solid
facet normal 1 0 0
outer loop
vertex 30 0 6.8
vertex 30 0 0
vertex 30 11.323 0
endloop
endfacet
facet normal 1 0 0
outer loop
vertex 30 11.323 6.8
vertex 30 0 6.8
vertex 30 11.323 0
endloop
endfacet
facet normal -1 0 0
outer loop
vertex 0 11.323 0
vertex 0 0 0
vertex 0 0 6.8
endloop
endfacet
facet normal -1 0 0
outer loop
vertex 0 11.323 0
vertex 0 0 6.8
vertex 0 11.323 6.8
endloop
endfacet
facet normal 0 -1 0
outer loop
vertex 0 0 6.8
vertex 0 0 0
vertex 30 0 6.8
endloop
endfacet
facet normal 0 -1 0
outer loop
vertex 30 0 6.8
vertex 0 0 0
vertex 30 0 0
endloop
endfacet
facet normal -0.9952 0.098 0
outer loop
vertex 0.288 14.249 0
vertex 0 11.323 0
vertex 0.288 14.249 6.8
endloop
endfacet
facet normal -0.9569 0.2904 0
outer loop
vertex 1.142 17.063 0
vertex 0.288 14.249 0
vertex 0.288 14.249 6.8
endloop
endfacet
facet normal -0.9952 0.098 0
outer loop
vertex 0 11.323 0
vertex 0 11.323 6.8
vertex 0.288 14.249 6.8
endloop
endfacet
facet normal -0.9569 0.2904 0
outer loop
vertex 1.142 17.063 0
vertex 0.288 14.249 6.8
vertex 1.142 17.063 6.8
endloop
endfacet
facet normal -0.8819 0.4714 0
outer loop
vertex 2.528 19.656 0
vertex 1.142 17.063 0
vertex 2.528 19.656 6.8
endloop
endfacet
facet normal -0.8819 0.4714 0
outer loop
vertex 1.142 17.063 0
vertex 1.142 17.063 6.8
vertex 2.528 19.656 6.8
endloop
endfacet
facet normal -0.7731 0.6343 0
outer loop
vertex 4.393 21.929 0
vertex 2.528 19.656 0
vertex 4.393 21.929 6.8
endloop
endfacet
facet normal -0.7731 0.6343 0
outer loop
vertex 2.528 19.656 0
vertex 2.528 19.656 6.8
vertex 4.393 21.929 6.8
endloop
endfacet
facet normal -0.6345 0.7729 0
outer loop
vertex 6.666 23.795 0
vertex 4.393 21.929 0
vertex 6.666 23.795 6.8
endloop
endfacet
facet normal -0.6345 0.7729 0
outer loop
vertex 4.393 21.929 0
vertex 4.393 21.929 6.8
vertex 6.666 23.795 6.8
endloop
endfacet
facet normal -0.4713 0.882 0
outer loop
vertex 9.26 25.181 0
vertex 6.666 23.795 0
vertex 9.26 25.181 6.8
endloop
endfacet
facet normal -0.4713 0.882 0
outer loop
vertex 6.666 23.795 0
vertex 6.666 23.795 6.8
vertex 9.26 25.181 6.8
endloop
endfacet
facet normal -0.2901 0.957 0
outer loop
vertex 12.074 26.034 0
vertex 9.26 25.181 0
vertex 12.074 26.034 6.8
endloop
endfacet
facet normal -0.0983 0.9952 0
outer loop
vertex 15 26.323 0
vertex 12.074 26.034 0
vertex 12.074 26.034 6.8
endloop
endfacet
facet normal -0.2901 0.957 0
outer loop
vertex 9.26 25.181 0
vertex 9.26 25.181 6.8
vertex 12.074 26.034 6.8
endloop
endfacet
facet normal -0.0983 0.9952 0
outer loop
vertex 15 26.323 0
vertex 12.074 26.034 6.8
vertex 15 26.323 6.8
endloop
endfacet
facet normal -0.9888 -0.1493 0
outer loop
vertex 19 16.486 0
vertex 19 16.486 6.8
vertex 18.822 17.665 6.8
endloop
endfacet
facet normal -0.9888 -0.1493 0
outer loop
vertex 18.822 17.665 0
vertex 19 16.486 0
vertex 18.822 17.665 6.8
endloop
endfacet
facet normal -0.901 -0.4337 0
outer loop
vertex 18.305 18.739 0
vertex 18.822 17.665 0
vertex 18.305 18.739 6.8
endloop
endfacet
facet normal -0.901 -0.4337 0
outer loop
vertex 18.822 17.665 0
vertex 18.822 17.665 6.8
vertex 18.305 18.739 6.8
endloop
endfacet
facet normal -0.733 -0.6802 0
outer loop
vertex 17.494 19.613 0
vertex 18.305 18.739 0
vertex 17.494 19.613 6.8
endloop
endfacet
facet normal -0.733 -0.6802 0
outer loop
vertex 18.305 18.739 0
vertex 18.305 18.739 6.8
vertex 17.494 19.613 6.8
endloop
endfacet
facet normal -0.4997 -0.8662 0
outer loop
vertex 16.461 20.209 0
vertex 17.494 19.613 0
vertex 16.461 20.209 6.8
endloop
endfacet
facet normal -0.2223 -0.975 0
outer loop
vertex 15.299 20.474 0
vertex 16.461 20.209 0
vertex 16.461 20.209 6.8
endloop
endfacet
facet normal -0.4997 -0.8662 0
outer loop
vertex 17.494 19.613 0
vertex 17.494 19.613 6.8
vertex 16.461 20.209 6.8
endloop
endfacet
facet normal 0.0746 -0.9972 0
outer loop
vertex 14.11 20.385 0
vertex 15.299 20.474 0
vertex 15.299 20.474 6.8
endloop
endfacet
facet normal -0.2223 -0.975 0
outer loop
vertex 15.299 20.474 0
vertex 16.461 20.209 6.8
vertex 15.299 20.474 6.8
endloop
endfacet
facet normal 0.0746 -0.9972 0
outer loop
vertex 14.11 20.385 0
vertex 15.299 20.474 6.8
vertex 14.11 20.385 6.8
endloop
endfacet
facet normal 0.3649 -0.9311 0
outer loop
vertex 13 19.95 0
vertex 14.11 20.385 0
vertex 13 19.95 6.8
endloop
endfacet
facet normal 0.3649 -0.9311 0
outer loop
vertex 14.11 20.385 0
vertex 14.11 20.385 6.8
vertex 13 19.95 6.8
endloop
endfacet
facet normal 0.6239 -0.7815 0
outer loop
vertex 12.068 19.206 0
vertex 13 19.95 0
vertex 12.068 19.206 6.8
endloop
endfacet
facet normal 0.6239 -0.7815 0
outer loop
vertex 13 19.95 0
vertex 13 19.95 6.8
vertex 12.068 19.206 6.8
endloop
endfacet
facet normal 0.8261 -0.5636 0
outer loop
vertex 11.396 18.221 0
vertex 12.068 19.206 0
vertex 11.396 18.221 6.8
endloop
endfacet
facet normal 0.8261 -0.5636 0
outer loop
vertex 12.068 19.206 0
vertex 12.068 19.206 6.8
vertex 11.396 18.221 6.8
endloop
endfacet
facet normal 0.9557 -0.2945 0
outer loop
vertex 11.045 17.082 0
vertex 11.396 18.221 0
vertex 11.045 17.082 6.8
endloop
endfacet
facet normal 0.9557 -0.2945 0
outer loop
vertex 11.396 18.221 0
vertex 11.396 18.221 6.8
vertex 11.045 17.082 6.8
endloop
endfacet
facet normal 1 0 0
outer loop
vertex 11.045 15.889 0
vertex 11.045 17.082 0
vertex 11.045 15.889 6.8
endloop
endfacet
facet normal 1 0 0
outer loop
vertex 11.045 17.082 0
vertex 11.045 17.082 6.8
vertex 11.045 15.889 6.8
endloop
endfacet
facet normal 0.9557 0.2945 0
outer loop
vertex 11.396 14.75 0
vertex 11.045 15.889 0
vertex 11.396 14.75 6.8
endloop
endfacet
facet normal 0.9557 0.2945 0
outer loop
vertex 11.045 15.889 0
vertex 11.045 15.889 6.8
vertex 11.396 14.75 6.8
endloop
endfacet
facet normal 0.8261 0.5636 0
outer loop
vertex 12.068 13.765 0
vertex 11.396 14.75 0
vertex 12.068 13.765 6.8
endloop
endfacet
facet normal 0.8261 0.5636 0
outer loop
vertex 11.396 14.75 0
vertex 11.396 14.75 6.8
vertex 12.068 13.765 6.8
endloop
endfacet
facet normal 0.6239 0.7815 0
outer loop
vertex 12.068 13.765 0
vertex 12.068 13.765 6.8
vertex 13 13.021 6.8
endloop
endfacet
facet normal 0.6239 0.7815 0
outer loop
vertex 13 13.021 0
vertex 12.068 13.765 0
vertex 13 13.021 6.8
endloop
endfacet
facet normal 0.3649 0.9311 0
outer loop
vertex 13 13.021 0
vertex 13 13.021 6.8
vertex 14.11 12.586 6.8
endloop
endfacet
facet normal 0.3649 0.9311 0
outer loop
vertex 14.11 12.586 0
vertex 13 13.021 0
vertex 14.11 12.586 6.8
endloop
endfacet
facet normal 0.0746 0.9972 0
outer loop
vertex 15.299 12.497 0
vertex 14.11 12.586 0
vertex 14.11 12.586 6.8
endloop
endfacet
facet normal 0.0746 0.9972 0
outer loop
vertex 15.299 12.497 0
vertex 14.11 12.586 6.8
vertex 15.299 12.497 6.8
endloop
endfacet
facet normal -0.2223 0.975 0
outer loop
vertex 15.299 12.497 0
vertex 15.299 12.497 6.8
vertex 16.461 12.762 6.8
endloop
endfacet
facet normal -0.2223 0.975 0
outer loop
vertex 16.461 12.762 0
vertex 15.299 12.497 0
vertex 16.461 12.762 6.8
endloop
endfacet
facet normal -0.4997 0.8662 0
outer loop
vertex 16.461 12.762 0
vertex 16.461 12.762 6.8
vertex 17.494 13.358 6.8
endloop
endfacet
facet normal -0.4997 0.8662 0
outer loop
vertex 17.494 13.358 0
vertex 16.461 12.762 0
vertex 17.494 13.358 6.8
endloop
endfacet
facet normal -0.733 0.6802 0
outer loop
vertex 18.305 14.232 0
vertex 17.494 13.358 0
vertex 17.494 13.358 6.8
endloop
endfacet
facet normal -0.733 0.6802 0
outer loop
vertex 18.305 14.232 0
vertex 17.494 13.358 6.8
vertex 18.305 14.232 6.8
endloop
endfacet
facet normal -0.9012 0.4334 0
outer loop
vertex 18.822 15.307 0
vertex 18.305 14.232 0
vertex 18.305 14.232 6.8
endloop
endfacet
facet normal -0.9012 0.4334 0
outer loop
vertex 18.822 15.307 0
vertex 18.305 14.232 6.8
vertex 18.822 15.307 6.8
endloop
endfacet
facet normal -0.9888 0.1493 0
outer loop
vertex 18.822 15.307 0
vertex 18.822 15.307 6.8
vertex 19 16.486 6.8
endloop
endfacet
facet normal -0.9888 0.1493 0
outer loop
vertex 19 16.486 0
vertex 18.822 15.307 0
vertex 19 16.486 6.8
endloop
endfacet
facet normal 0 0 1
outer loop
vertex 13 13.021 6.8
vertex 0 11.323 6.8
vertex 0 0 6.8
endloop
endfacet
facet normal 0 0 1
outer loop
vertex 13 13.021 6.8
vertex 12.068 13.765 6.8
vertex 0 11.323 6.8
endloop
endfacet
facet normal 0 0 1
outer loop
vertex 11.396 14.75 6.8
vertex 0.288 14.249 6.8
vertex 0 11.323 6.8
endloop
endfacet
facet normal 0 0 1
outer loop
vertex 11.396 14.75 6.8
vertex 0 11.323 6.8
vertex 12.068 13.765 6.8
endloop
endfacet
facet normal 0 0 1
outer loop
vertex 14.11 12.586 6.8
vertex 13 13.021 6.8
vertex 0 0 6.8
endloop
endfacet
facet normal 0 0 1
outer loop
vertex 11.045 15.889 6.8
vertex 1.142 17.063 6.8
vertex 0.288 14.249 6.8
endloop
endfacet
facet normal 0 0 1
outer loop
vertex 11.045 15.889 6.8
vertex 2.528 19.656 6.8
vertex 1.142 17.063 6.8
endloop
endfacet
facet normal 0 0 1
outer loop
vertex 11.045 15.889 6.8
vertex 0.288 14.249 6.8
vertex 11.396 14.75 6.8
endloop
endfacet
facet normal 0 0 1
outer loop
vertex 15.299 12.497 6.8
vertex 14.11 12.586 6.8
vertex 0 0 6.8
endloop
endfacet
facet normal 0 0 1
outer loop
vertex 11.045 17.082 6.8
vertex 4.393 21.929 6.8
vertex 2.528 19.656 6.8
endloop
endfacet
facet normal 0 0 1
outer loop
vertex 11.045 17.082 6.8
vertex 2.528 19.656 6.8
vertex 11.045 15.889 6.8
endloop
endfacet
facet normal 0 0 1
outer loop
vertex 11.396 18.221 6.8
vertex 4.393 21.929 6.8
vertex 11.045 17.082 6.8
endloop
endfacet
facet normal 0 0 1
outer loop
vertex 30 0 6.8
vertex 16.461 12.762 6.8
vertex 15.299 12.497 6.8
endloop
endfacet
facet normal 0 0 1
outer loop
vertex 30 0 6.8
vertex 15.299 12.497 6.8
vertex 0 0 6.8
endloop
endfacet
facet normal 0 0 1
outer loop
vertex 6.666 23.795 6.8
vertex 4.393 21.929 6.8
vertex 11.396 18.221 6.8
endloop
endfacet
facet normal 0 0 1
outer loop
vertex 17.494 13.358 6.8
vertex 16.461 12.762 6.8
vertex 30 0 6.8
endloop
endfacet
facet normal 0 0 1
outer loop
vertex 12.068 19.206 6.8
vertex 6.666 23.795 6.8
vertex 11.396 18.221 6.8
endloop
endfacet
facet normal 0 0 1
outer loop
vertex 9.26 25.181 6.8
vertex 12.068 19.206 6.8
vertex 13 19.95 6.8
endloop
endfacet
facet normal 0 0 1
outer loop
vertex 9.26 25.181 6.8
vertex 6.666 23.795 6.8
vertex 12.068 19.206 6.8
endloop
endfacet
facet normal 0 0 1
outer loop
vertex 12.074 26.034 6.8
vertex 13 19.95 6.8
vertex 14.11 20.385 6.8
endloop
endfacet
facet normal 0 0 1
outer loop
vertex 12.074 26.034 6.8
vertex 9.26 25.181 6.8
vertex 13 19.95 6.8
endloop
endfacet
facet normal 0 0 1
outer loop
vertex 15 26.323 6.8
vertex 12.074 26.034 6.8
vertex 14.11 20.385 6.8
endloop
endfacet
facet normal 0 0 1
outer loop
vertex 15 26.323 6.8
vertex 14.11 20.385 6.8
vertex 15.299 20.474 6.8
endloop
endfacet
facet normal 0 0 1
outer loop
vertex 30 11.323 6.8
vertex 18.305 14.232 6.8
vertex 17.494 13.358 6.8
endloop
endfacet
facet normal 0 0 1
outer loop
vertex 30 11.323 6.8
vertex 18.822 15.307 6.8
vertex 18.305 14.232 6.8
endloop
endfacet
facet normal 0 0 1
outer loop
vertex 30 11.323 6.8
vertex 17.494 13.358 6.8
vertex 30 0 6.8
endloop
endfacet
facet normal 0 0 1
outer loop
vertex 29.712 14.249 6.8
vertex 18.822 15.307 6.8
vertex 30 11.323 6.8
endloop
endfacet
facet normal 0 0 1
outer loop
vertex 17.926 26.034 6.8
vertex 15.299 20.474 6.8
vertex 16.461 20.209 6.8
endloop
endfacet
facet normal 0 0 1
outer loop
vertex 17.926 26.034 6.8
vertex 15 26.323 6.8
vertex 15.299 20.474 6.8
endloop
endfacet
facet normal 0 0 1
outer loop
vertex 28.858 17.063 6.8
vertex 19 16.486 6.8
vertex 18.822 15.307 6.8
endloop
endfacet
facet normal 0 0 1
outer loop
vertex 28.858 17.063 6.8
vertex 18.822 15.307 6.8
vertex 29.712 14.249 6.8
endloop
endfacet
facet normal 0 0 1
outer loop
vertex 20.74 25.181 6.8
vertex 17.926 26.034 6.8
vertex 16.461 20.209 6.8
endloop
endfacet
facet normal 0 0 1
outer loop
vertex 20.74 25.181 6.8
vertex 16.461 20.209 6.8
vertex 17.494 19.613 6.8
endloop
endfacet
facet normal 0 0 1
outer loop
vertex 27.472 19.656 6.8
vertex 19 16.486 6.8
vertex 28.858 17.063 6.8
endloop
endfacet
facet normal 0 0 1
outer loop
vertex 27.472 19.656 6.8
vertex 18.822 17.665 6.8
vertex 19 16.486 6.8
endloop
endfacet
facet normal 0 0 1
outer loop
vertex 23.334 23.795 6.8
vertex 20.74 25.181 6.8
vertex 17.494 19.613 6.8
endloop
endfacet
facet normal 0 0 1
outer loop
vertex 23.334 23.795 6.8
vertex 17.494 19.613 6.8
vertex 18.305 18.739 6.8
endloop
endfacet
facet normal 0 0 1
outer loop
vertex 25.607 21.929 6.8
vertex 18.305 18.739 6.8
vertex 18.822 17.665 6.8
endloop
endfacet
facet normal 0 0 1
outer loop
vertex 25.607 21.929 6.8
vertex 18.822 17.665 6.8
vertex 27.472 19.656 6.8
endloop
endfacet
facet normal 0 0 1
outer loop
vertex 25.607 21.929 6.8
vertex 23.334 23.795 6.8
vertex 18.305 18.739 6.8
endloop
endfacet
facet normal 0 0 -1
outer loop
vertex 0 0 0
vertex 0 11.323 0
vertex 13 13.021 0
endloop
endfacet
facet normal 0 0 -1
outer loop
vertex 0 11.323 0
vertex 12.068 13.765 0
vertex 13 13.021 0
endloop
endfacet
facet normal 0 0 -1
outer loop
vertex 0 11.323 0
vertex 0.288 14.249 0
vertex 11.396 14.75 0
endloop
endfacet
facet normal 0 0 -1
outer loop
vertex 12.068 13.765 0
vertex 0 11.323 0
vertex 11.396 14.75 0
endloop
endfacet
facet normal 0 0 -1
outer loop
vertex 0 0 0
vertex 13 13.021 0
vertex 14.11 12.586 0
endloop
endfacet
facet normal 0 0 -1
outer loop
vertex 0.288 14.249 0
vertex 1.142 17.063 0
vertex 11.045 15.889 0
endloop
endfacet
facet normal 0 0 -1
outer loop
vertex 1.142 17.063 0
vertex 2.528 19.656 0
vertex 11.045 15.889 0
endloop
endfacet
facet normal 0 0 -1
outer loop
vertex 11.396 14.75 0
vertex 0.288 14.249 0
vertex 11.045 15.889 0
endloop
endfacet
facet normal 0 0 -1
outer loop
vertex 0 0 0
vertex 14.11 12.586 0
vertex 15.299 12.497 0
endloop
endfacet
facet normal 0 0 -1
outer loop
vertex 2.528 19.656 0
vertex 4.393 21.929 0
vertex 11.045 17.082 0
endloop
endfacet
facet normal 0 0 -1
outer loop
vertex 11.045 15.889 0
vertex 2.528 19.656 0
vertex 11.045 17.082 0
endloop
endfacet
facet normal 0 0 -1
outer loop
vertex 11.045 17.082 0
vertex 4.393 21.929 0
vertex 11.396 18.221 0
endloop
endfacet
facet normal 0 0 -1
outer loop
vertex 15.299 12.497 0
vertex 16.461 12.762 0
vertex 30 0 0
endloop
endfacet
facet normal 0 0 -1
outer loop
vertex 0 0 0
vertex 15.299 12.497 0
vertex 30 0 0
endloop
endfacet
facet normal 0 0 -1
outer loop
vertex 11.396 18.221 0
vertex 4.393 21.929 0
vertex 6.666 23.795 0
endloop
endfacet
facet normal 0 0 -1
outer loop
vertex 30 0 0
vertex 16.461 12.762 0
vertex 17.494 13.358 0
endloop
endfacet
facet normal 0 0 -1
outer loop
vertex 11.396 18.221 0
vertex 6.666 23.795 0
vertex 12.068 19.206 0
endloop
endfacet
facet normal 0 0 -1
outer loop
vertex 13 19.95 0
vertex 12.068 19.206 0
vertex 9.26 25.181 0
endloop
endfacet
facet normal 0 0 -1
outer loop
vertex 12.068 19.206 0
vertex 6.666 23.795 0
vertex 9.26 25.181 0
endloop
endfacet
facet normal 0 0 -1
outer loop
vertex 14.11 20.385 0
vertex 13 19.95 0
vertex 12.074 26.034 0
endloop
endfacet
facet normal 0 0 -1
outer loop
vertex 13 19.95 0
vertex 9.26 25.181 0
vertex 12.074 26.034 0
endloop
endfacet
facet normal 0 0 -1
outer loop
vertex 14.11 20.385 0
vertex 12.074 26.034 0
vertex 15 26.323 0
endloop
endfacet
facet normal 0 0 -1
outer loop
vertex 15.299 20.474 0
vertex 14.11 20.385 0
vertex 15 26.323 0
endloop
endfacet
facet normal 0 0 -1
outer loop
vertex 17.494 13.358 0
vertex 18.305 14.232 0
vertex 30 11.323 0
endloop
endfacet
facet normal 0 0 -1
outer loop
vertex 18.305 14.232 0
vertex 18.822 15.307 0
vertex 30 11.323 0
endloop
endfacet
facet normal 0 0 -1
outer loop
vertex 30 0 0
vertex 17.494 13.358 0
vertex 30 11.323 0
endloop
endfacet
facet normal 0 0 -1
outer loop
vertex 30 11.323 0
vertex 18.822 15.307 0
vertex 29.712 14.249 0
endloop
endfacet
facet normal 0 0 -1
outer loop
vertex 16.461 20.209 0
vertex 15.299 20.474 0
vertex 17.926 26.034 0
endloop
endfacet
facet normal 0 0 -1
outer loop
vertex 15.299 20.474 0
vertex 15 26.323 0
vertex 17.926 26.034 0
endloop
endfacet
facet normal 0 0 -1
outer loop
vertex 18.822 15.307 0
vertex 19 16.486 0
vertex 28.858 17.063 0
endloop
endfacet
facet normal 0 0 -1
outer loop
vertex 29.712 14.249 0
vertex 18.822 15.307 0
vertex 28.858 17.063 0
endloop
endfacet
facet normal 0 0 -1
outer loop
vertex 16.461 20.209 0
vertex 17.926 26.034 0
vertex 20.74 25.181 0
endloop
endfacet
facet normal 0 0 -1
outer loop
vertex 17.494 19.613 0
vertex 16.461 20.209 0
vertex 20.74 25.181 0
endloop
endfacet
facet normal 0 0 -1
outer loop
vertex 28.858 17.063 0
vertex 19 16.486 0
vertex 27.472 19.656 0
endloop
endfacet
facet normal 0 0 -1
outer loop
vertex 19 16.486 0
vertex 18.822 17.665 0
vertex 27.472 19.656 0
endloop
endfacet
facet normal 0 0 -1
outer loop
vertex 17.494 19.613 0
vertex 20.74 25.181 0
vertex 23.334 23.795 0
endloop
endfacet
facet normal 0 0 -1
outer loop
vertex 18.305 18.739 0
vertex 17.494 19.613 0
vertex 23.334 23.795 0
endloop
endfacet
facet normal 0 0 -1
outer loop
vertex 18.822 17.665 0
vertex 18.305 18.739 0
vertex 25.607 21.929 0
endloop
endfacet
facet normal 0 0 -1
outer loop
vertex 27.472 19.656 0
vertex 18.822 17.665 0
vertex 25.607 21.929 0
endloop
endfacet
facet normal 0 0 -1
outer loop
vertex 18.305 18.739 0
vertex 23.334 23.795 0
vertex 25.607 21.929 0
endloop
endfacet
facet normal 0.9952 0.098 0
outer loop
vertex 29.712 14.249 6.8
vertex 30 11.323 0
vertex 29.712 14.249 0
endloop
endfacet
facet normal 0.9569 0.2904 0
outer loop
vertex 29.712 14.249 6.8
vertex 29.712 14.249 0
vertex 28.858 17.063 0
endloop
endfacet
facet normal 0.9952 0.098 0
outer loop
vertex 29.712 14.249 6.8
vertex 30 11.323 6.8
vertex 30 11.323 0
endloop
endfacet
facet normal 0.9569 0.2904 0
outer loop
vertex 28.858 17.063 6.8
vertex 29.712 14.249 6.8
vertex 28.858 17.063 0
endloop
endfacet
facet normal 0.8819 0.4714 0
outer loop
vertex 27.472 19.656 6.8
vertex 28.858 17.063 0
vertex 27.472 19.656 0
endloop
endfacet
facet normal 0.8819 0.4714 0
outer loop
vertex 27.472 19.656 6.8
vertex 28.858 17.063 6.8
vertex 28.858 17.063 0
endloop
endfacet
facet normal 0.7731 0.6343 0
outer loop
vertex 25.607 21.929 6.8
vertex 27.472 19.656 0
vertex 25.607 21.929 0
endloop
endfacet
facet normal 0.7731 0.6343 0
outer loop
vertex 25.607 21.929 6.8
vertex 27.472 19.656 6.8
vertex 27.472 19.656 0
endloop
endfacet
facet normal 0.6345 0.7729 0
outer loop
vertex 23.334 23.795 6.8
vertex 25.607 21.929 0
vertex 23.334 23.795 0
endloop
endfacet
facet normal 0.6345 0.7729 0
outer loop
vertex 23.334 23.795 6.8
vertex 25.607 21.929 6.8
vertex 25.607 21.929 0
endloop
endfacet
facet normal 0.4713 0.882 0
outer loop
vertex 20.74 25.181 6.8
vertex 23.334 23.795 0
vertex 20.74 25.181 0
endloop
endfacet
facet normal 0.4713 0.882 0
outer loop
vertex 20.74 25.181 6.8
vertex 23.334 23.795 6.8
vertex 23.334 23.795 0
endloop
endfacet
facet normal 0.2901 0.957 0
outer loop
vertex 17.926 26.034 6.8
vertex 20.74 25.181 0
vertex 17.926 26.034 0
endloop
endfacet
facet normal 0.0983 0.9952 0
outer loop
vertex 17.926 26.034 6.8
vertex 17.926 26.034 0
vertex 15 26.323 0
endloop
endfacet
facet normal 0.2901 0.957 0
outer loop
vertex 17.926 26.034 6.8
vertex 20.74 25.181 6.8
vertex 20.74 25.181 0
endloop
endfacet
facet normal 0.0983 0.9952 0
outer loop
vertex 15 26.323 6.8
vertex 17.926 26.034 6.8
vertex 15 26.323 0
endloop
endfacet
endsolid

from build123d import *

# Parameters (mm, degrees)
CROQUIS1_W              = 30
CROQUIS1_H              = 26.322580645
SALIENTE_EXTRUIR1_DEPTH = 6.8
REDONDEO1_R             = 15
CORTAR_EXTRUIR1_REACH   = 42.486
CROQUIS2_R              = 4


with BuildPart() as part:
    # Croquis1 → Saliente-Extruir1 (new body)
    with BuildSketch(Plane.XY):
        with Locations((15, 13.161290323)):
            Rectangle(CROQUIS1_W, CROQUIS1_H)
    extrude(amount=SALIENTE_EXTRUIR1_DEPTH)

    # Redondeo1
    redondeo1_edges = [part.edges().sort_by_distance(p)[0] for p in [
        (0, 26.322580645, 3.4),
        (30, 26.322580645, 3.4),
    ]]
    fillet(redondeo1_edges, radius=REDONDEO1_R - 0.0001)  # a hair under: the kernel refuses the full size

    # Croquis2 → Cortar-Extruir1 (cut, up to next)
    with BuildSketch(Plane.XY.offset(6.8), mode=Mode.PRIVATE) as cortar_extruir1_sk1:
        with Locations((15, 16.485572524)):
            Circle(CROQUIS2_R)
    cortar_extruir1_tool1 = extrude(cortar_extruir1_sk1.sketch, amount=-CORTAR_EXTRUIR1_REACH, mode=Mode.PRIVATE) & part.part
    add(cortar_extruir1_tool1.solids().sort_by_distance((15, 16.485573, 6.8))[0], mode=Mode.SUBTRACT)


solid = part.part
